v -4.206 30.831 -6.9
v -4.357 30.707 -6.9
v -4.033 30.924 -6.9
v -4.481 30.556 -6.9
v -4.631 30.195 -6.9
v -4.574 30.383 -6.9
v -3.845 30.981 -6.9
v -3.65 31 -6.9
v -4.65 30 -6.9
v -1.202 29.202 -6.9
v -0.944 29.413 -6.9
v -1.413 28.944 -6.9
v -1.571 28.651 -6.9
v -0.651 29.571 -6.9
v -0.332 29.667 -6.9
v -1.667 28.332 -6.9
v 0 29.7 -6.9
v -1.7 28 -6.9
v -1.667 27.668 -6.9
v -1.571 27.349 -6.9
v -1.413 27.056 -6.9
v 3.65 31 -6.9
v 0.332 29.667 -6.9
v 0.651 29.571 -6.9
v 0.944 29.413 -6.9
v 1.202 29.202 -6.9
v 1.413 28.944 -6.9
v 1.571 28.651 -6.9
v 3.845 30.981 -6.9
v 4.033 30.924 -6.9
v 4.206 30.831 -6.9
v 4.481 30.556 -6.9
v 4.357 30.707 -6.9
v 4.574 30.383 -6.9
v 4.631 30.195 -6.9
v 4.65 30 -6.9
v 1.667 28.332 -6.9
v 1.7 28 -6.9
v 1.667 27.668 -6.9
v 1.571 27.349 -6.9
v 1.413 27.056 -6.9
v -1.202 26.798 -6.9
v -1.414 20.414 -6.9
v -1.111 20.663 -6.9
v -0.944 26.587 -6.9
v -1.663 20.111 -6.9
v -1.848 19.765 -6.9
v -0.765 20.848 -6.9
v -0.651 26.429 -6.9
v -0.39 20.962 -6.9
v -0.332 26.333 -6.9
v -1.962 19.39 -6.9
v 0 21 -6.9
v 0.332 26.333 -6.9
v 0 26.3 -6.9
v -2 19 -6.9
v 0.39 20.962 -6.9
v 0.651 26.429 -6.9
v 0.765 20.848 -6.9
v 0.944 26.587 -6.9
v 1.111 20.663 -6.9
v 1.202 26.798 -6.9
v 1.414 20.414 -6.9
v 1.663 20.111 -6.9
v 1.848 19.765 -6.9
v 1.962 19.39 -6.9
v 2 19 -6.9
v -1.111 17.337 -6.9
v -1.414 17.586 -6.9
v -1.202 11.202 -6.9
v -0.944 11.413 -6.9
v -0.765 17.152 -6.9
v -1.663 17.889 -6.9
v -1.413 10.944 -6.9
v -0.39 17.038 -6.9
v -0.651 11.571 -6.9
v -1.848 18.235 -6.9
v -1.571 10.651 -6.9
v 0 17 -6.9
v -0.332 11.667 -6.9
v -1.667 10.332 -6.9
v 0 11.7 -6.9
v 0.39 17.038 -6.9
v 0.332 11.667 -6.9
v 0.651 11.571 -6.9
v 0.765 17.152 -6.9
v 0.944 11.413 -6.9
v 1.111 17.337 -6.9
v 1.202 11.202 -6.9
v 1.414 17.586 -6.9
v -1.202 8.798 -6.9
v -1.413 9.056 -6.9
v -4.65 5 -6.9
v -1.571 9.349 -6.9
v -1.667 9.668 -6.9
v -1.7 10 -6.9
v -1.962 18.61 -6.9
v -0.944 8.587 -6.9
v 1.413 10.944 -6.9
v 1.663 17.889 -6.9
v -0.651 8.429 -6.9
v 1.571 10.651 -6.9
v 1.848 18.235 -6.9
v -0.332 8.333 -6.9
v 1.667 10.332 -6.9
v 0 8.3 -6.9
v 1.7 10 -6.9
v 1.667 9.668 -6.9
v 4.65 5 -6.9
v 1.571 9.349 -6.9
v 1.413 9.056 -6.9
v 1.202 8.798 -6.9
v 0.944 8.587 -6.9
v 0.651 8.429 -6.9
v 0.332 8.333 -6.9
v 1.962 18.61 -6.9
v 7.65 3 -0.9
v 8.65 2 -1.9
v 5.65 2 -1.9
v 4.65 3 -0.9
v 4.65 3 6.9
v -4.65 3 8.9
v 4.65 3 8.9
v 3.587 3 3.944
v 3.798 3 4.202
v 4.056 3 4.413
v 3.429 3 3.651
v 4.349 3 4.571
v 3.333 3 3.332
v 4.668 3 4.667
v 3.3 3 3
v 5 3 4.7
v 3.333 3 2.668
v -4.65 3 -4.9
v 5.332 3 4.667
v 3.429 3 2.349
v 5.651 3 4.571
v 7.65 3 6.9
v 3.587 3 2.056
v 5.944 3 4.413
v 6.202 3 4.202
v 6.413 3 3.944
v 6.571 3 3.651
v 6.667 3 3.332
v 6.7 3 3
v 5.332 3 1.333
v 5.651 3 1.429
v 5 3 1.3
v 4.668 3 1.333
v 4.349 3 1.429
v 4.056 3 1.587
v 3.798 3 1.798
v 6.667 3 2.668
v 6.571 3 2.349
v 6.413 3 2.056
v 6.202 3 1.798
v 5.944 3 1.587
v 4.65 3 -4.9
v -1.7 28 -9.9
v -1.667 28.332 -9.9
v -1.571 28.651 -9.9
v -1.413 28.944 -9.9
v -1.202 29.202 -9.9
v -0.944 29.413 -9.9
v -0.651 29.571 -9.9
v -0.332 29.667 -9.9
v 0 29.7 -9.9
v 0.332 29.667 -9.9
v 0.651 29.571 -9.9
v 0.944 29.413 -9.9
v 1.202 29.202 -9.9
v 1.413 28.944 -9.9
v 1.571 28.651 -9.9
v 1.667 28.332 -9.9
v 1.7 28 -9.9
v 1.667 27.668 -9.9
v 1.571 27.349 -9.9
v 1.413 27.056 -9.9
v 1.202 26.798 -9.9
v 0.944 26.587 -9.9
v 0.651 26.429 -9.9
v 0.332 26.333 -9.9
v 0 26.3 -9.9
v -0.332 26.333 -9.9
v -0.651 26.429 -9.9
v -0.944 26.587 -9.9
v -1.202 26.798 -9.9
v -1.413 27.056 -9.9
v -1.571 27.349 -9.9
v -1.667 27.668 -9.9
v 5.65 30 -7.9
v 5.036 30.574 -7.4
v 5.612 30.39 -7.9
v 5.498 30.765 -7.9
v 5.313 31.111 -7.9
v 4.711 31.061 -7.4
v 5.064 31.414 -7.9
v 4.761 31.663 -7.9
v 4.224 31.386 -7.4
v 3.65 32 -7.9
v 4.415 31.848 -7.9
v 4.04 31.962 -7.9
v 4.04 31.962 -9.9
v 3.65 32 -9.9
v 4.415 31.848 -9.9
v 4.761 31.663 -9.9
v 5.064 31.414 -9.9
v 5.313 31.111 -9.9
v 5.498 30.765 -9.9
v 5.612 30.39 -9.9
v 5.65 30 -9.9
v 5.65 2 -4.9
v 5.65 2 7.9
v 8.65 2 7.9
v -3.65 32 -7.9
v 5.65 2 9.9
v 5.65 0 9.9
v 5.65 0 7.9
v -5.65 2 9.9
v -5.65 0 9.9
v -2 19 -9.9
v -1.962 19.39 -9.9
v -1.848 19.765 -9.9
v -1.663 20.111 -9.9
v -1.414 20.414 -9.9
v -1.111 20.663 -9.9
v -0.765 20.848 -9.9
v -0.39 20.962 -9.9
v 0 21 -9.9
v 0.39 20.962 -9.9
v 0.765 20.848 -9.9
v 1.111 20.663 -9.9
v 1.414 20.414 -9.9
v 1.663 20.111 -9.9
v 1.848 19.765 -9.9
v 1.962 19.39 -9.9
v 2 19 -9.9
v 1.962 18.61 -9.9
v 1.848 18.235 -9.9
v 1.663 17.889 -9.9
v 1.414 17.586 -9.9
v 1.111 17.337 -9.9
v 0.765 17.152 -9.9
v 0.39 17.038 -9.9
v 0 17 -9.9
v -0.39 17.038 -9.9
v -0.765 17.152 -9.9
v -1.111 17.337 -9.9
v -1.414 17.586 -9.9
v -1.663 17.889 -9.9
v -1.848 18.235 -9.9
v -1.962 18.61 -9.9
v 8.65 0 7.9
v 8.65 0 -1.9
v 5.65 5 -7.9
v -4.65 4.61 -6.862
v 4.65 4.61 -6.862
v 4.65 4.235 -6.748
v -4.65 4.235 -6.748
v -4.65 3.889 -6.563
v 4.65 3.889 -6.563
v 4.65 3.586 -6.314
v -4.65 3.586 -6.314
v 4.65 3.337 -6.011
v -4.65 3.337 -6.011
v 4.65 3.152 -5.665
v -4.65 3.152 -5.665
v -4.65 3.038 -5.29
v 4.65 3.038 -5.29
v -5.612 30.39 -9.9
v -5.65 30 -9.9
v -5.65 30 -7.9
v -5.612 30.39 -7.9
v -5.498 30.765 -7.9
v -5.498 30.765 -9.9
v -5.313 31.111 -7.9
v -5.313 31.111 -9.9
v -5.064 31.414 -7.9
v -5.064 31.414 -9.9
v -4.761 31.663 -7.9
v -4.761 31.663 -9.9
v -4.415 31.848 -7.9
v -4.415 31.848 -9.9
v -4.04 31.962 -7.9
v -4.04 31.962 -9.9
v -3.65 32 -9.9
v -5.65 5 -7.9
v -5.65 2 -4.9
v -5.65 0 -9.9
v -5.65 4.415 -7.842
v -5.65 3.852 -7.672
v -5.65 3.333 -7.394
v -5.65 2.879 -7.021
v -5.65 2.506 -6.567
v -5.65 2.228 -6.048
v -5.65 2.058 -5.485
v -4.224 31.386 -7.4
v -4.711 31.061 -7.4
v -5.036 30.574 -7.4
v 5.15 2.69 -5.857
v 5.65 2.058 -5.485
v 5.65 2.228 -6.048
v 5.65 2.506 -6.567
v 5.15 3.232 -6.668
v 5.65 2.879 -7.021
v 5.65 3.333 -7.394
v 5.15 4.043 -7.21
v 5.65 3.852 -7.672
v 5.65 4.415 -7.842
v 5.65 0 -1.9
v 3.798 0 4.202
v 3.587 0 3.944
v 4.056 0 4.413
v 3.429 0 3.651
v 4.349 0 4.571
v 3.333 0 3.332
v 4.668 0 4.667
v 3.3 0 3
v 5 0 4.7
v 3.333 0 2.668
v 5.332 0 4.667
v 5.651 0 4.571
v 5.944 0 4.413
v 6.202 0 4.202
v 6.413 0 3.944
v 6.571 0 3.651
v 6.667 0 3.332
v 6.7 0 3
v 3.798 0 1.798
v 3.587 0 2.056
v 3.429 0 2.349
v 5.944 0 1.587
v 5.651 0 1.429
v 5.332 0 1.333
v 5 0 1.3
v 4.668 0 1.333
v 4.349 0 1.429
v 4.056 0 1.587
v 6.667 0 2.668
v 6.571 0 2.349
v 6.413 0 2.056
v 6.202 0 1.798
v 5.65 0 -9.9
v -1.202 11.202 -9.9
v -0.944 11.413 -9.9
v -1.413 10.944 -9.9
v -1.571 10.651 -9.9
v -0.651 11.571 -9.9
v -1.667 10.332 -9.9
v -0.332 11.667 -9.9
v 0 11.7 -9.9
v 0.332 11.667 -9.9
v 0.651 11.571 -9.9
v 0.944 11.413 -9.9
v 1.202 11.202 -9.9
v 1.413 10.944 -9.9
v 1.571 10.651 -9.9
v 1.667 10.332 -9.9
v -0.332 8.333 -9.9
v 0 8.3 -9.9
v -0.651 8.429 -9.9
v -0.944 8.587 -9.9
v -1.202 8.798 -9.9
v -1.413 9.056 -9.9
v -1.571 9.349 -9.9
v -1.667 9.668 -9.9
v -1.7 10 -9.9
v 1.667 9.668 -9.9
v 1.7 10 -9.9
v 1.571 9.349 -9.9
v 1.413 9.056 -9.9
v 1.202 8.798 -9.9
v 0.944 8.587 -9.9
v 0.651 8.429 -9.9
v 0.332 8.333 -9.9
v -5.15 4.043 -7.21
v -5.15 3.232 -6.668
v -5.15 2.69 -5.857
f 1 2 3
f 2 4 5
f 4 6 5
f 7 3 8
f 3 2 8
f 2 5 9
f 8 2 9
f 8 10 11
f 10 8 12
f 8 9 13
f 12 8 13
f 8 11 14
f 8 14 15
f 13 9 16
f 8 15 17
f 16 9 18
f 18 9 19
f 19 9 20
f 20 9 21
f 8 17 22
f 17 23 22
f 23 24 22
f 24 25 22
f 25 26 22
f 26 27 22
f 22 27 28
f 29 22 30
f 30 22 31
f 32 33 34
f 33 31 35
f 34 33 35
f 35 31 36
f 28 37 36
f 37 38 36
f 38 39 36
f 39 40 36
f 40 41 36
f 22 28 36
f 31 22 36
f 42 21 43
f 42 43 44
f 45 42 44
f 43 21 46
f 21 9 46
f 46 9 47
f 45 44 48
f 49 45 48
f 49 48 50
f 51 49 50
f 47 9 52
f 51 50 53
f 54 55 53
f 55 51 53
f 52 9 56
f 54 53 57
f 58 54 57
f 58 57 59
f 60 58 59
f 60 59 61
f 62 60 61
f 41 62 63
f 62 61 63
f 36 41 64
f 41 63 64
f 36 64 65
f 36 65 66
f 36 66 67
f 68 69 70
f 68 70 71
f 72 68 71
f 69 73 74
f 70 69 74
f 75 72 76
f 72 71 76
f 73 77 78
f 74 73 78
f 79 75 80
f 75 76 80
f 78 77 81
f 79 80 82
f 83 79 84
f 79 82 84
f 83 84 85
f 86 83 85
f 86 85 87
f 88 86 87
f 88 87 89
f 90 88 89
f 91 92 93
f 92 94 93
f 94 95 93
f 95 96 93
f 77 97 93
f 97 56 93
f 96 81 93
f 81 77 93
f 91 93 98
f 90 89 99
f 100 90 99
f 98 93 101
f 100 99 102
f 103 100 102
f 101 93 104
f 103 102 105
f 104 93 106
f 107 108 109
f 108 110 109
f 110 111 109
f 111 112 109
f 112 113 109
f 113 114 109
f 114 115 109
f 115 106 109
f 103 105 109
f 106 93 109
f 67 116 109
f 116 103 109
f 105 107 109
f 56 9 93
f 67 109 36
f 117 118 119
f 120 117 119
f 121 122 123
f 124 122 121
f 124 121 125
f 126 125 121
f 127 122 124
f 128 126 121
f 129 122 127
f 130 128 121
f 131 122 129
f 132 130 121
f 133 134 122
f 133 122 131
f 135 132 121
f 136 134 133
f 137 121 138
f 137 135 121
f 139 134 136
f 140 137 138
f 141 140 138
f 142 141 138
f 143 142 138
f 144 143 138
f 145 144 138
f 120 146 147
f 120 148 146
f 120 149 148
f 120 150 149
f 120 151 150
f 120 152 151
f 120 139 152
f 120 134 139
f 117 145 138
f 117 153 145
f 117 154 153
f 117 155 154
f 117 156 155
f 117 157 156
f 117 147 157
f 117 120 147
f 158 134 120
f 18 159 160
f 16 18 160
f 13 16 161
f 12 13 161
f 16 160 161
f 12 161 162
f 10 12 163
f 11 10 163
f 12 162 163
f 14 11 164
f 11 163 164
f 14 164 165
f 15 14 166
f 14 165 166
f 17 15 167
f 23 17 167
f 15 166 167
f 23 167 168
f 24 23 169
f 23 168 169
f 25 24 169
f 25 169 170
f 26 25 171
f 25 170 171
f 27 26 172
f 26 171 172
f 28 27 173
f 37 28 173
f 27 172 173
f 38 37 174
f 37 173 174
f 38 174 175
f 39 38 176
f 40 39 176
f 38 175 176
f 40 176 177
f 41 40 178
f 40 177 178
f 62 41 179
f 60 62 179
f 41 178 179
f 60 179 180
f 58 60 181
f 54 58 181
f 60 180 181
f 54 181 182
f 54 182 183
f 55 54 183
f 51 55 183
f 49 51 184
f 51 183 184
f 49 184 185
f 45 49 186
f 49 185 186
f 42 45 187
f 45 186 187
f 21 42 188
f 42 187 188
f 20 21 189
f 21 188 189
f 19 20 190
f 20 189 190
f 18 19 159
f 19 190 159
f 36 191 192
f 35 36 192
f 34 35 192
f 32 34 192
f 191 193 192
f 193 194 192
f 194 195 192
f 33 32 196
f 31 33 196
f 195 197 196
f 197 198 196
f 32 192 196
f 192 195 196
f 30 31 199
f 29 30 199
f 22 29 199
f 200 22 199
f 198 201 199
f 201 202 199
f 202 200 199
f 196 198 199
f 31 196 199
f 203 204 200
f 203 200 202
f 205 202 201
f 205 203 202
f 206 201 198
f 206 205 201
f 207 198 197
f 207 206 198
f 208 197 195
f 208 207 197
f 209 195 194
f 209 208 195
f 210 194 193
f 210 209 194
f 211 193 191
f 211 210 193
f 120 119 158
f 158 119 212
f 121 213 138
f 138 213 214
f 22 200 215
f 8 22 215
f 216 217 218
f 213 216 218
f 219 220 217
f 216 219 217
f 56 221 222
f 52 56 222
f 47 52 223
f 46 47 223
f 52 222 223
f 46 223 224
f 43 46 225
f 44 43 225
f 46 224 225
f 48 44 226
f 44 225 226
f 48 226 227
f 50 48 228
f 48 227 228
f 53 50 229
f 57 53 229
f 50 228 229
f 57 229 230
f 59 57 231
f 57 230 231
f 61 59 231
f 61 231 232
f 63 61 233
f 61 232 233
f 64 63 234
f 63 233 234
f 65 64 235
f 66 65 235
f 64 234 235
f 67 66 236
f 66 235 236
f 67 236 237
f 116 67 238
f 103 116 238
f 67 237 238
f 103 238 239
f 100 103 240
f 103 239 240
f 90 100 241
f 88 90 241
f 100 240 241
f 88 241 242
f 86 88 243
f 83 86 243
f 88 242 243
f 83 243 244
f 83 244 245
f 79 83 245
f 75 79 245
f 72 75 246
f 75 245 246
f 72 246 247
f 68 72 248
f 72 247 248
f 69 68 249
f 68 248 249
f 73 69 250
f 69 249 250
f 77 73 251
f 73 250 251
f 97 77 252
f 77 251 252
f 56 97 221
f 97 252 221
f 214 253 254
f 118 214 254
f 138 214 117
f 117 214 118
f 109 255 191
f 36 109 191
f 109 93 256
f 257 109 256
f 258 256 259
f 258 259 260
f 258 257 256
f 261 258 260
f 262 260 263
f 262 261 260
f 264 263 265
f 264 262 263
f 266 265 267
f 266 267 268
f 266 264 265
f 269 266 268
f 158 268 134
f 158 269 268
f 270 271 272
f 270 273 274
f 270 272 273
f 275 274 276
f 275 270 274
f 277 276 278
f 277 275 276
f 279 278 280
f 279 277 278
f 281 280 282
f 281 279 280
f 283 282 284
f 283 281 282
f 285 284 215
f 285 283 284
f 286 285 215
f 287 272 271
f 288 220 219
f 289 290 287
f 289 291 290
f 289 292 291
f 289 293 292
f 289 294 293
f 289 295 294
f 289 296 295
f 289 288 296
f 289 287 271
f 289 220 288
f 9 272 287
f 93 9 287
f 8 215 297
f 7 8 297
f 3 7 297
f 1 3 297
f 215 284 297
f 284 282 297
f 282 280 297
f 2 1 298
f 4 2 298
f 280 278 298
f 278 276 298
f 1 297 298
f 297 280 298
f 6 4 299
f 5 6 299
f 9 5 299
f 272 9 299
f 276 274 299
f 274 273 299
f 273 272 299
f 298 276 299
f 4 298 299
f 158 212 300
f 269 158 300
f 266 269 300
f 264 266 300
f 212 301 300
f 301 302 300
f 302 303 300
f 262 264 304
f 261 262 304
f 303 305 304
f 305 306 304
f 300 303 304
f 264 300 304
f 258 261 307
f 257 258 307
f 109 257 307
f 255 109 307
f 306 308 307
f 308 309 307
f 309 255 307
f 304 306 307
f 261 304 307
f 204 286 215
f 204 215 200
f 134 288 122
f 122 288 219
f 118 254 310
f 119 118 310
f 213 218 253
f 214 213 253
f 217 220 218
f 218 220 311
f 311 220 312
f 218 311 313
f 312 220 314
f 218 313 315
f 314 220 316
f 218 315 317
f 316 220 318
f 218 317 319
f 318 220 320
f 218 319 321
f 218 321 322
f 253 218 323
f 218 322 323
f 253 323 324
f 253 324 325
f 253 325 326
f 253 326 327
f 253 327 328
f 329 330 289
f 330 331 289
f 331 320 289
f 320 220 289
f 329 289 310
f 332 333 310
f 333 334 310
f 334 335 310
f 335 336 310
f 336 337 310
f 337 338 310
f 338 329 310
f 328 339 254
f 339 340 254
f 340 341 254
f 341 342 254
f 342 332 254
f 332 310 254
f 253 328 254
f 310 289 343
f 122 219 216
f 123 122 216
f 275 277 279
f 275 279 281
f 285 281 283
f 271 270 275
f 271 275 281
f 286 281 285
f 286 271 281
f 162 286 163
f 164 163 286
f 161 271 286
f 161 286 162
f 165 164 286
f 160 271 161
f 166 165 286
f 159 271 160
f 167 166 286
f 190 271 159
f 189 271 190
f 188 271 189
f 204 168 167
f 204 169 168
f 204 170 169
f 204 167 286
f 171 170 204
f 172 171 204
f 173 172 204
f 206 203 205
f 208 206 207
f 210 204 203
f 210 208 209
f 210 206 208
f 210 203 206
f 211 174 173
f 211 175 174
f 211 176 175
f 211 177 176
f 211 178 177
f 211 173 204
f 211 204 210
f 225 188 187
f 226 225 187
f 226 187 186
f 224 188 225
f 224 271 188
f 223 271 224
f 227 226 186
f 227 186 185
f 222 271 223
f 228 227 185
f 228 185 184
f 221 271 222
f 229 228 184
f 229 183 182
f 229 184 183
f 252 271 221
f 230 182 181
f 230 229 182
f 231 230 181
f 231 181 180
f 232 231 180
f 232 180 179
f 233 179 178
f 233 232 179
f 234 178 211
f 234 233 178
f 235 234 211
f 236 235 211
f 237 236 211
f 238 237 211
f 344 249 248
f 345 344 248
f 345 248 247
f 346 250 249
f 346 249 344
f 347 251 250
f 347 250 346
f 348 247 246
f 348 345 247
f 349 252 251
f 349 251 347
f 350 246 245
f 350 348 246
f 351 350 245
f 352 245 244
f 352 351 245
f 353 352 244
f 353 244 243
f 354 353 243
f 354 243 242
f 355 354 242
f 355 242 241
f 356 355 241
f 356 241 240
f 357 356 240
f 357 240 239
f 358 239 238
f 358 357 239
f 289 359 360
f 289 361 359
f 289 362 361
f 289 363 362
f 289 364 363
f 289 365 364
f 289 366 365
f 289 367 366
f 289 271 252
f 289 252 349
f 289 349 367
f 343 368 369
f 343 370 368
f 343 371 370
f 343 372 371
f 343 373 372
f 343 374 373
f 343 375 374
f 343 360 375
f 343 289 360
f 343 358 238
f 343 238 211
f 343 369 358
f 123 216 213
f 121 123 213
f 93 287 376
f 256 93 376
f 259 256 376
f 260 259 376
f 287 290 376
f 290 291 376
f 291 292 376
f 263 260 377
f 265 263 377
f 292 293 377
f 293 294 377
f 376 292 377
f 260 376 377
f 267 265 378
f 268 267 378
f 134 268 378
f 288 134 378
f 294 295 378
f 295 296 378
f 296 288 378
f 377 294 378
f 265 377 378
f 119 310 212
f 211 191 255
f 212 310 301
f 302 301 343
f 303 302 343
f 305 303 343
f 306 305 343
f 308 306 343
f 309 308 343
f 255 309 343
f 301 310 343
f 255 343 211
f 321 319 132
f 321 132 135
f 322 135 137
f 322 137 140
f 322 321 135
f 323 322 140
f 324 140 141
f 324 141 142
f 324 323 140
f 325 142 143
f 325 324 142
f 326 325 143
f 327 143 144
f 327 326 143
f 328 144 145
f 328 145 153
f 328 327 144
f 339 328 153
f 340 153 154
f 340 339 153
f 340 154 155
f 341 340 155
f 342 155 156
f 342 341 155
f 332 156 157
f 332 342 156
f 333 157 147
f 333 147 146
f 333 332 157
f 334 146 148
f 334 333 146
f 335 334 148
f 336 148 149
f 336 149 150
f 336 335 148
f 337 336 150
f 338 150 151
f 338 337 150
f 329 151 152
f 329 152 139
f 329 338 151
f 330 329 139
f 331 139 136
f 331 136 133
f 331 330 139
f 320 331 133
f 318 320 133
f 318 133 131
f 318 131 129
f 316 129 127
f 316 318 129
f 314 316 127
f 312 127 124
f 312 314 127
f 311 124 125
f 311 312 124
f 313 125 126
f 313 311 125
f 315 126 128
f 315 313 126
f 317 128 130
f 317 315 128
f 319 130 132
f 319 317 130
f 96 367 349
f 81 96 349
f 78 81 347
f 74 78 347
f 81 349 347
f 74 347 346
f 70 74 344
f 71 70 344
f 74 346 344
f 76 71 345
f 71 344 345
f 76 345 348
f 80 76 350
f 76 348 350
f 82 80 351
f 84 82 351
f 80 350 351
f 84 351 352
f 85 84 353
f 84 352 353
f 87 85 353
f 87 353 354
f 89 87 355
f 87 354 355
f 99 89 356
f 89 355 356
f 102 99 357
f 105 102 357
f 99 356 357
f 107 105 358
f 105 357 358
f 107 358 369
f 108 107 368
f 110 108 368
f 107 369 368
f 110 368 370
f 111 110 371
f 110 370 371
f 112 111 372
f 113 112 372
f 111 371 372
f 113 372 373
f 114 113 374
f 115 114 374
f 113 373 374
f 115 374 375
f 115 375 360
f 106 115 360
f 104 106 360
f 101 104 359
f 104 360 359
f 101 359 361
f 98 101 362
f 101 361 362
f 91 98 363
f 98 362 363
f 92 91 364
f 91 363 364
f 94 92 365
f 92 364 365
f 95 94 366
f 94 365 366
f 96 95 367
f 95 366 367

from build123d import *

# Parameters (mm, degrees)
SKETCH1_R           = 1.7
BOSS_EXTRUDE1_DEPTH = 3
SKETCH2_W           = 11.3
SKETCH2_H           = 3
BOSS_EXTRUDE2_DEPTH = 29
SKETCH3_R           = 1.7
SKETCH3_R_2         = 2
CUT_EXTRUDE1_DEPTH  = 3
FILLET1_R           = 2
CHAMFER1_SIZE       = 1


with BuildPart() as part:
    # Sketch1 → Boss-Extrude1 (new body)
    with BuildSketch(Plane(origin=(0, 0, 0), x_dir=(1, 0, 0), z_dir=(0, 1, 0))):
        Polygon((5.65, 9.9), (-5.65, 9.9), (-5.65, -9.9), (5.65, -9.9), (5.65, -7.9), (8.65, -7.9), (8.65, 1.9), (5.65, 1.9), align=None)
        with Locations(Location((5, -3, 0), (0, 0, 270))):
            Circle(SKETCH1_R, mode=Mode.SUBTRACT)
    extrude(amount=BOSS_EXTRUDE1_DEPTH)

    # Sketch2 → Boss-Extrude2 (add)
    with BuildSketch(Plane(origin=(0, 3, 0), x_dir=(1, 0, 0), z_dir=(0, 1, 0))):
        with Locations((0, 8.4)):
            Rectangle(SKETCH2_W, SKETCH2_H)
    extrude(amount=BOSS_EXTRUDE2_DEPTH)

    # Sketch3 → Cut-Extrude1 (cut)
    with BuildSketch(Plane(origin=(0, 0, -9.9), x_dir=(-1, 0, 0), z_dir=(0, 0, -1))):
        with Locations((0, 28)):
            Circle(SKETCH3_R)
        with Locations((0, 10)):
            Circle(SKETCH3_R)
        with Locations((0, 19)):
            Circle(SKETCH3_R_2)
    extrude(amount=-CUT_EXTRUDE1_DEPTH, mode=Mode.SUBTRACT)

    # Fillet1
    fillet1_edges = [part.edges().sort_by_distance(p)[0] for p in [
        (0, 3, -6.9),
        (-5.65, 32, -8.4),
        (5.65, 32, -8.4),
    ]]
    fillet(fillet1_edges, radius=FILLET1_R)

    # Chamfer1
    chamfer1_edges = [part.edges().sort_by_distance(p)[0] for p in [
        (7.15, 3, -1.9),
        (0, 3, 9.9),
        (5.65, 3, 8.9),
        (7.15, 3, 7.9),
        (8.65, 3, 3),
        (5.65, 17.5, -6.9),
        (0, 32, -6.9),
        (-5.65, 17.5, -6.9),
        (-5.064213562, 31.414213562, -6.9),
        (5.064213562, 31.414213562, -6.9),
        (-5.65, 3, 2.5),
        (5.65, 3, -3.4),
        (5.65, 3.585786438, -6.314213562),
        (-5.65, 3.585786438, -6.314213562),
    ]]
    chamfer(chamfer1_edges, length=CHAMFER1_SIZE)


solid = part.part
